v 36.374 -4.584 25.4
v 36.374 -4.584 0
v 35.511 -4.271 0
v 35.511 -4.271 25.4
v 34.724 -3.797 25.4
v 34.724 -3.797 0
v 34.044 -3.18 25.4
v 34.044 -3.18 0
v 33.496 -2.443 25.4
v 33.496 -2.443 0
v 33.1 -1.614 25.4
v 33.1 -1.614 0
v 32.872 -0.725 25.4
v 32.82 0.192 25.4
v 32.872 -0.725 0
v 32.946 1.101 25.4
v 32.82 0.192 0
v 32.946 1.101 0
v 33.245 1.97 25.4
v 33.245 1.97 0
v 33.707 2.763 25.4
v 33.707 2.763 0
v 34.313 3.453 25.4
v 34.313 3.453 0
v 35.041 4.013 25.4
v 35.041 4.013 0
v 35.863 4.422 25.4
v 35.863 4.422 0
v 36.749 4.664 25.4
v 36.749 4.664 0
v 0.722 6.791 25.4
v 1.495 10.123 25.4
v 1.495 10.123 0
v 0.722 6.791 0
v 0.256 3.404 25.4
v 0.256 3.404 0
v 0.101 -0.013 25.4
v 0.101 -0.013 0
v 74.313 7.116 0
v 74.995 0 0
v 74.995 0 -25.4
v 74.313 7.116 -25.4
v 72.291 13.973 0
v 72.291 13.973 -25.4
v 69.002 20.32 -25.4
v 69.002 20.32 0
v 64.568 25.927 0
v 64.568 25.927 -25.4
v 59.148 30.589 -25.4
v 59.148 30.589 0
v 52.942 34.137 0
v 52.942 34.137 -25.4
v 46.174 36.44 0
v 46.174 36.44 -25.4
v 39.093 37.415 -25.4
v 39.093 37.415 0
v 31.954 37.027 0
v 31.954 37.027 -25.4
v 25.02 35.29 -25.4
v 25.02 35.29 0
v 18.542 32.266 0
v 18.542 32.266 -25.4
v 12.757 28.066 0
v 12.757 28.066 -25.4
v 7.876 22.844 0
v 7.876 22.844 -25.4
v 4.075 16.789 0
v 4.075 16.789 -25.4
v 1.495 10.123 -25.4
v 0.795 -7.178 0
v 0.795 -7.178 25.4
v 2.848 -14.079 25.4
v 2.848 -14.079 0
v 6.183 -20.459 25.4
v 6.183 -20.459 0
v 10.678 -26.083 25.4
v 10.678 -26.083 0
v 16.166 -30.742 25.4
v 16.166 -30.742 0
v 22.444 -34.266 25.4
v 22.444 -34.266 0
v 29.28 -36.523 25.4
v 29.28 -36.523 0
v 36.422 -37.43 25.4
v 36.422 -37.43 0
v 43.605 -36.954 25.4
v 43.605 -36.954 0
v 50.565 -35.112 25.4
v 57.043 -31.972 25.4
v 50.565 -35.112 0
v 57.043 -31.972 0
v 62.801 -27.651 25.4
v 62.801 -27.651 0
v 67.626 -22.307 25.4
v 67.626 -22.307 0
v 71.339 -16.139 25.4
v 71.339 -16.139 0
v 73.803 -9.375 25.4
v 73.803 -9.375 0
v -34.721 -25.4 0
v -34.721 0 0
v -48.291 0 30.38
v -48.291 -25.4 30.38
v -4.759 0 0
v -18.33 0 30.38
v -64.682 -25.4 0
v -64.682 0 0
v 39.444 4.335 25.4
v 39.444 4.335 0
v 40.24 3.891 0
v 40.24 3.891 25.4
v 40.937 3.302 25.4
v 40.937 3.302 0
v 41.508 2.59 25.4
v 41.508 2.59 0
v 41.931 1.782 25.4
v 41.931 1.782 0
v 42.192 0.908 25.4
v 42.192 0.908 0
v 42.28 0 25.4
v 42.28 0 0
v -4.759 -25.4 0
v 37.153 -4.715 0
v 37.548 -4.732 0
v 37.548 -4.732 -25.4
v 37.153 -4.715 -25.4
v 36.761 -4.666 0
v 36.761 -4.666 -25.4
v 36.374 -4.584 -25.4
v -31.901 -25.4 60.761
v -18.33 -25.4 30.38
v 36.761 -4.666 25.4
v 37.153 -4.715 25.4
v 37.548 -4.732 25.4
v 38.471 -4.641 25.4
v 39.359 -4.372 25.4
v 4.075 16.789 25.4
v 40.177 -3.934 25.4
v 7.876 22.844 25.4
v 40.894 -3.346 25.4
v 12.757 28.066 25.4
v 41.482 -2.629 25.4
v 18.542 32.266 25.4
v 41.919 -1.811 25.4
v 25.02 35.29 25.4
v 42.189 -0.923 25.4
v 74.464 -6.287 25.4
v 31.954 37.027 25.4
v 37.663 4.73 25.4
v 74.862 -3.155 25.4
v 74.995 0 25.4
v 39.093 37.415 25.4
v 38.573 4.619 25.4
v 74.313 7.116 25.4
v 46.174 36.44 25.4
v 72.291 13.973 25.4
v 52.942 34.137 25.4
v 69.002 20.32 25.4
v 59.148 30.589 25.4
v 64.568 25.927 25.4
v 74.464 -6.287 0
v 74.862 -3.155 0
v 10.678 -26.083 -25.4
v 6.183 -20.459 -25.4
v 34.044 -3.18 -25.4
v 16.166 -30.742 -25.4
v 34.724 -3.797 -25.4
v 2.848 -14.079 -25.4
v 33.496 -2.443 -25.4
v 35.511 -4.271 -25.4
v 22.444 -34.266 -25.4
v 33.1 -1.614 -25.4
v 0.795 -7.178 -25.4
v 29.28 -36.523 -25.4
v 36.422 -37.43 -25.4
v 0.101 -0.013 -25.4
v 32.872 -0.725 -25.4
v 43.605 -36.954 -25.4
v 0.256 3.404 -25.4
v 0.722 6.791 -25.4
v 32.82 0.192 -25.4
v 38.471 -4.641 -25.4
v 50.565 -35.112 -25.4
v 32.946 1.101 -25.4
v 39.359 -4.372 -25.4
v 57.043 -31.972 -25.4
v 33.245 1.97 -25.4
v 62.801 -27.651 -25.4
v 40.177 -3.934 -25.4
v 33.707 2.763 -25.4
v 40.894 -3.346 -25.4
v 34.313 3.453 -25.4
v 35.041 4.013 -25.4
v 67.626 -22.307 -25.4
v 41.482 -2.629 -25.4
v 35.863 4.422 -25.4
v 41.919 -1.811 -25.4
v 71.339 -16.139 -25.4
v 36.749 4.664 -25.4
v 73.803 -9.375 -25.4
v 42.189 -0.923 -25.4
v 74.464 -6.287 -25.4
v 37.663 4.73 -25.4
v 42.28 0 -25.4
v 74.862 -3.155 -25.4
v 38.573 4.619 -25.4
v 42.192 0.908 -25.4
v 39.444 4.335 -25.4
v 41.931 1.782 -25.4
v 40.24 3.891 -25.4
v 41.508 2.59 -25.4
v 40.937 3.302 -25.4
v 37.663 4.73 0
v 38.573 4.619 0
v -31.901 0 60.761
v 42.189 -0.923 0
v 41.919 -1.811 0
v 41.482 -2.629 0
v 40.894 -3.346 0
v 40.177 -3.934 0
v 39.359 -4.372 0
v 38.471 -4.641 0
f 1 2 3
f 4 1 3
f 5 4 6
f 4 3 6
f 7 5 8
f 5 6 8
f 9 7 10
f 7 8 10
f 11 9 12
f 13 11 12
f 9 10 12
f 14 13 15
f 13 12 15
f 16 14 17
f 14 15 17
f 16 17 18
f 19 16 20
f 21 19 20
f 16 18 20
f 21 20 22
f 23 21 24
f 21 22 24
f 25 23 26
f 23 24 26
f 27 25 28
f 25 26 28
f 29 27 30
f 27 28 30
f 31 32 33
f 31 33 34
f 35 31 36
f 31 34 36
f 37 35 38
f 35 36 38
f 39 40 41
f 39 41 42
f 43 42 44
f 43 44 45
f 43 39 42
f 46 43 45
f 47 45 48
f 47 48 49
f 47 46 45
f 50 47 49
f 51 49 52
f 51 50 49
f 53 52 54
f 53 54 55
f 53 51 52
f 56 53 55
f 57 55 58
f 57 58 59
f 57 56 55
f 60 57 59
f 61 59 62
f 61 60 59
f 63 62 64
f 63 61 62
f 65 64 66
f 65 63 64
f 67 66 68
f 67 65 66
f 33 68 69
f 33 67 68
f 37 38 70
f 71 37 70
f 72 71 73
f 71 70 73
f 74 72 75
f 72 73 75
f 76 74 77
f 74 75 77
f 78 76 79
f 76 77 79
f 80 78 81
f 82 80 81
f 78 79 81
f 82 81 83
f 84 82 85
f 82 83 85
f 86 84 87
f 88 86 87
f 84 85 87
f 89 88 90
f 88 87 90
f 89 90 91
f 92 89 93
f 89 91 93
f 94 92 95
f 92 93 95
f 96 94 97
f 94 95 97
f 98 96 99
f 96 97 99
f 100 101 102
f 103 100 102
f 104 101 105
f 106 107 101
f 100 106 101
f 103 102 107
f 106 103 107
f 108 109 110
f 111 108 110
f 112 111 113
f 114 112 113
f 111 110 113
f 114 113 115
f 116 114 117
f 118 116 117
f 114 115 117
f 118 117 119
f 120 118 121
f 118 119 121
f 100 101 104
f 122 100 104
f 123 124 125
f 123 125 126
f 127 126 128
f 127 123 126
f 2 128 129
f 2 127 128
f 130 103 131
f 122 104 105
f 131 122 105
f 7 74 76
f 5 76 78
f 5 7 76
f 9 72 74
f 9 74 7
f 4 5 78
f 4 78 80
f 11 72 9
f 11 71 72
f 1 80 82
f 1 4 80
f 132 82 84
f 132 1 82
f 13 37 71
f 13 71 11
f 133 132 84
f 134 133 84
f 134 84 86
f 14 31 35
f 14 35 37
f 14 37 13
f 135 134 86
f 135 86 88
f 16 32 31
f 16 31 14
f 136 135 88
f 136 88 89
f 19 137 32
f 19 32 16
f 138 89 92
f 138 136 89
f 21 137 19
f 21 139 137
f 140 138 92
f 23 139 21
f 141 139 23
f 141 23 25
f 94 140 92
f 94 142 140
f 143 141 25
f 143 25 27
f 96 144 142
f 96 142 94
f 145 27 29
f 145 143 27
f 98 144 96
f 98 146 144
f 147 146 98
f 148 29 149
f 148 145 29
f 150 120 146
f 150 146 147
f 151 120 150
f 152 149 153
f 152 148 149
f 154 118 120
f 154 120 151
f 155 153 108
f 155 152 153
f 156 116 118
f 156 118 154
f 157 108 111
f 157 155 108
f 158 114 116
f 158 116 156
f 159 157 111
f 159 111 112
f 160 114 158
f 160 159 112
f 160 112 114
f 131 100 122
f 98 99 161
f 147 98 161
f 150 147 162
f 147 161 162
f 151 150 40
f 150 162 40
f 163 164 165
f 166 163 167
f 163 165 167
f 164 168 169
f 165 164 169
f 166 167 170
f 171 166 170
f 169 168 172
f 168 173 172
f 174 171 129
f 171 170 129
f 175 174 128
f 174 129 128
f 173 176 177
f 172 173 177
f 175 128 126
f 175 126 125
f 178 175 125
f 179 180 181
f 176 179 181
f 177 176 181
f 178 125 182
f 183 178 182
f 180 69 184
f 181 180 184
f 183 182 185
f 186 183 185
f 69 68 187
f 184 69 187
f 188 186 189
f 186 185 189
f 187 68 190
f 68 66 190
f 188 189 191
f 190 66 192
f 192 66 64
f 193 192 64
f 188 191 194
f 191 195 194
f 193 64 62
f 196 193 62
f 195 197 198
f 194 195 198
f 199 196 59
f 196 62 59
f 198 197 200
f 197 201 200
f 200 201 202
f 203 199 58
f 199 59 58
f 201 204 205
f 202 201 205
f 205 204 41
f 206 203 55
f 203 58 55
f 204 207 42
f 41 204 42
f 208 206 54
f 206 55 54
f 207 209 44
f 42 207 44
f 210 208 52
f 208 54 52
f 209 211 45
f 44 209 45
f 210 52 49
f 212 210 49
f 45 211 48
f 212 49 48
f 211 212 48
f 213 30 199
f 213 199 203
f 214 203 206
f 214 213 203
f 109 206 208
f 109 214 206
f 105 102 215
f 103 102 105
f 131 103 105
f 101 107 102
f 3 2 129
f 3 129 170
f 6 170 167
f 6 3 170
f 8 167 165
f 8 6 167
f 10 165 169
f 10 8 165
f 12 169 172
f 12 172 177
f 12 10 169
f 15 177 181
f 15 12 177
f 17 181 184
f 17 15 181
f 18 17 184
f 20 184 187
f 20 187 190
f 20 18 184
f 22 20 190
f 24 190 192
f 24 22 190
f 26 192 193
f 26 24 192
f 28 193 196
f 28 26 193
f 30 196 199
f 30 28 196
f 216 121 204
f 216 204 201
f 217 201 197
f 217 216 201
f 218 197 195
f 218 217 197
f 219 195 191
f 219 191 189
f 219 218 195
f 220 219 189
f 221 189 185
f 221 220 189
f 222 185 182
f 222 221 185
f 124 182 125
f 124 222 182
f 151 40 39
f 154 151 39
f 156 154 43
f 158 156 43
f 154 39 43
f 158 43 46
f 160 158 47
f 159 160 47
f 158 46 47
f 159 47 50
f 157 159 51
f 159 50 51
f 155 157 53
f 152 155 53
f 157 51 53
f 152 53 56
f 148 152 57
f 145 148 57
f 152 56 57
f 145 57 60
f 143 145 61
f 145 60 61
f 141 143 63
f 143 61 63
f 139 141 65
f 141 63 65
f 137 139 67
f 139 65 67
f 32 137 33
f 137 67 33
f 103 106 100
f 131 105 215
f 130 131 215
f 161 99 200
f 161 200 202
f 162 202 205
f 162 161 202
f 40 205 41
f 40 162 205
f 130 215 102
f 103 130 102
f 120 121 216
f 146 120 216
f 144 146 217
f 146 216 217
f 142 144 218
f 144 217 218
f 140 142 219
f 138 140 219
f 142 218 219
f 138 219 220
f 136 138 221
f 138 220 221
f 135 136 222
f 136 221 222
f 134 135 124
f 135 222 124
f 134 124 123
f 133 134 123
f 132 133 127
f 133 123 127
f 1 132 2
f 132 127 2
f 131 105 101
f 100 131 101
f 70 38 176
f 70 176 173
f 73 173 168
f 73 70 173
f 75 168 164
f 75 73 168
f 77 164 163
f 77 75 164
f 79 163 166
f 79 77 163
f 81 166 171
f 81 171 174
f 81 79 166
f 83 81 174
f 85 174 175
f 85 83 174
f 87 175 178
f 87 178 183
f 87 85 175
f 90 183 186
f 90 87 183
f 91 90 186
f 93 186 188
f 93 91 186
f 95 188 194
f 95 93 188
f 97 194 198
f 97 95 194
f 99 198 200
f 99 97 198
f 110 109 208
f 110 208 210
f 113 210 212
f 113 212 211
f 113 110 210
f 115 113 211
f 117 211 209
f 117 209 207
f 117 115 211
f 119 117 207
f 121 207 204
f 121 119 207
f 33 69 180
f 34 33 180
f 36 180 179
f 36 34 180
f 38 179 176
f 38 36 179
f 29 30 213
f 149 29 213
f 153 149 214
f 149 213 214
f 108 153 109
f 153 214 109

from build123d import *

# Parameters (mm, degrees)
F1_DEPTH = 25.4
F3_DEPTH = 25.4
F4_DEPTH = 25.4


with BuildPart() as f1:
    # F0 (on Front) → F1 (new body)
    with BuildSketch(Plane.XZ):
        Polygon((-31.900562346, 60.7608221471), (-48.2914559543, 30.3804110736), (-18.3296075556, 30.3804110736), align=None)
    extrude(amount=F1_DEPTH)


with BuildPart() as f1b:
    # F0 (on Front) → F1, piece 2 (new body)
    with BuildSketch(Plane.XZ):
        Polygon((-48.2914559543, 30.3804110736), (-64.6823495626, 0), (-34.720501164, 0), align=None)
    extrude(amount=F1_DEPTH)


with BuildPart() as f1c:
    # F0 (on Front) → F1, piece 3 (new body)
    with BuildSketch(Plane.XZ):
        Polygon((-18.3296075556, 30.3804110736), (-34.720501164, 0), (-4.7586527653, 0), align=None)
    extrude(amount=F1_DEPTH)


with BuildPart() as f3:
    # F2 (on Top) → F3 (new body)
    with BuildSketch(Plane.XY):
        with BuildLine():
            Line((37.5477857888, -4.7317177788), (73.8026180842, -9.3746957385))
            ThreePointArc((73.8026180842, -9.3746957385), (74.6957477779, -4.7251142857), (74.9950525109, 0))
            Line((74.9950525109, 0), (39.4438088688, 4.3352335137))
            ThreePointArc((39.4438088688, 4.3352335137), (41.5076215969, 2.5901454613), (42.2795035676, 0))
            ThreePointArc((42.2795035676, 0), (40.8936155168, -3.345829728), (37.5477857888, -4.7317177788))
        make_face()
        with BuildLine():
            ThreePointArc((0.1005212092, -0.0126675377), (32.8289547157, -37.1487606558), (73.8026180842, -9.3746957385))
            Line((73.8026180842, -9.3746957385), (37.5477857888, -4.7317177788))
            ThreePointArc((37.5477857888, -4.7317177788), (36.9561805848, -4.6945879926), (36.3738600322, -4.5837813491))
            Line((36.3738600322, -4.5837813491), (0.1005212092, -0.0126675377))
        make_face()
        with BuildLine():
            Line((39.4438088688, 4.3352335137), (74.9950525109, 0))
            ThreePointArc((74.9950525109, 0), (42.6568707612, 37.0971027939), (1.4946261159, 10.1226213284))
            Line((1.4946261159, 10.1226213284), (36.7491376414, 4.6638304295))
            ThreePointArc((36.7491376414, 4.6638304295), (38.1205439567, 4.6969246555), (39.4438088688, 4.3352335137))
        make_face()
        with BuildLine():
            ThreePointArc((1.4946261159, 10.1226213284), (0.4498193833, 5.1028103566), (0.1005212092, -0.0126675377))
            Line((0.1005212092, -0.0126675377), (36.3738600322, -4.5837813491))
            ThreePointArc((36.3738600322, -4.5837813491), (32.8199593481, 0.1918600657), (36.7491376414, 4.6638304295))
            Line((36.7491376414, 4.6638304295), (1.4946261159, 10.1226213284))
        make_face()
    extrude(amount=F3_DEPTH)

    # F4 (add): a face of the model
    f4_faces = [f3.faces().sort_by_distance(p)[0] for p in [
        (72.5812081141, -9.836310361, 0),
    ]]
    extrude(f4_faces, amount=F4_DEPTH)


solid = Compound([f1.part, f1b.part, f1c.part, f3.part])
